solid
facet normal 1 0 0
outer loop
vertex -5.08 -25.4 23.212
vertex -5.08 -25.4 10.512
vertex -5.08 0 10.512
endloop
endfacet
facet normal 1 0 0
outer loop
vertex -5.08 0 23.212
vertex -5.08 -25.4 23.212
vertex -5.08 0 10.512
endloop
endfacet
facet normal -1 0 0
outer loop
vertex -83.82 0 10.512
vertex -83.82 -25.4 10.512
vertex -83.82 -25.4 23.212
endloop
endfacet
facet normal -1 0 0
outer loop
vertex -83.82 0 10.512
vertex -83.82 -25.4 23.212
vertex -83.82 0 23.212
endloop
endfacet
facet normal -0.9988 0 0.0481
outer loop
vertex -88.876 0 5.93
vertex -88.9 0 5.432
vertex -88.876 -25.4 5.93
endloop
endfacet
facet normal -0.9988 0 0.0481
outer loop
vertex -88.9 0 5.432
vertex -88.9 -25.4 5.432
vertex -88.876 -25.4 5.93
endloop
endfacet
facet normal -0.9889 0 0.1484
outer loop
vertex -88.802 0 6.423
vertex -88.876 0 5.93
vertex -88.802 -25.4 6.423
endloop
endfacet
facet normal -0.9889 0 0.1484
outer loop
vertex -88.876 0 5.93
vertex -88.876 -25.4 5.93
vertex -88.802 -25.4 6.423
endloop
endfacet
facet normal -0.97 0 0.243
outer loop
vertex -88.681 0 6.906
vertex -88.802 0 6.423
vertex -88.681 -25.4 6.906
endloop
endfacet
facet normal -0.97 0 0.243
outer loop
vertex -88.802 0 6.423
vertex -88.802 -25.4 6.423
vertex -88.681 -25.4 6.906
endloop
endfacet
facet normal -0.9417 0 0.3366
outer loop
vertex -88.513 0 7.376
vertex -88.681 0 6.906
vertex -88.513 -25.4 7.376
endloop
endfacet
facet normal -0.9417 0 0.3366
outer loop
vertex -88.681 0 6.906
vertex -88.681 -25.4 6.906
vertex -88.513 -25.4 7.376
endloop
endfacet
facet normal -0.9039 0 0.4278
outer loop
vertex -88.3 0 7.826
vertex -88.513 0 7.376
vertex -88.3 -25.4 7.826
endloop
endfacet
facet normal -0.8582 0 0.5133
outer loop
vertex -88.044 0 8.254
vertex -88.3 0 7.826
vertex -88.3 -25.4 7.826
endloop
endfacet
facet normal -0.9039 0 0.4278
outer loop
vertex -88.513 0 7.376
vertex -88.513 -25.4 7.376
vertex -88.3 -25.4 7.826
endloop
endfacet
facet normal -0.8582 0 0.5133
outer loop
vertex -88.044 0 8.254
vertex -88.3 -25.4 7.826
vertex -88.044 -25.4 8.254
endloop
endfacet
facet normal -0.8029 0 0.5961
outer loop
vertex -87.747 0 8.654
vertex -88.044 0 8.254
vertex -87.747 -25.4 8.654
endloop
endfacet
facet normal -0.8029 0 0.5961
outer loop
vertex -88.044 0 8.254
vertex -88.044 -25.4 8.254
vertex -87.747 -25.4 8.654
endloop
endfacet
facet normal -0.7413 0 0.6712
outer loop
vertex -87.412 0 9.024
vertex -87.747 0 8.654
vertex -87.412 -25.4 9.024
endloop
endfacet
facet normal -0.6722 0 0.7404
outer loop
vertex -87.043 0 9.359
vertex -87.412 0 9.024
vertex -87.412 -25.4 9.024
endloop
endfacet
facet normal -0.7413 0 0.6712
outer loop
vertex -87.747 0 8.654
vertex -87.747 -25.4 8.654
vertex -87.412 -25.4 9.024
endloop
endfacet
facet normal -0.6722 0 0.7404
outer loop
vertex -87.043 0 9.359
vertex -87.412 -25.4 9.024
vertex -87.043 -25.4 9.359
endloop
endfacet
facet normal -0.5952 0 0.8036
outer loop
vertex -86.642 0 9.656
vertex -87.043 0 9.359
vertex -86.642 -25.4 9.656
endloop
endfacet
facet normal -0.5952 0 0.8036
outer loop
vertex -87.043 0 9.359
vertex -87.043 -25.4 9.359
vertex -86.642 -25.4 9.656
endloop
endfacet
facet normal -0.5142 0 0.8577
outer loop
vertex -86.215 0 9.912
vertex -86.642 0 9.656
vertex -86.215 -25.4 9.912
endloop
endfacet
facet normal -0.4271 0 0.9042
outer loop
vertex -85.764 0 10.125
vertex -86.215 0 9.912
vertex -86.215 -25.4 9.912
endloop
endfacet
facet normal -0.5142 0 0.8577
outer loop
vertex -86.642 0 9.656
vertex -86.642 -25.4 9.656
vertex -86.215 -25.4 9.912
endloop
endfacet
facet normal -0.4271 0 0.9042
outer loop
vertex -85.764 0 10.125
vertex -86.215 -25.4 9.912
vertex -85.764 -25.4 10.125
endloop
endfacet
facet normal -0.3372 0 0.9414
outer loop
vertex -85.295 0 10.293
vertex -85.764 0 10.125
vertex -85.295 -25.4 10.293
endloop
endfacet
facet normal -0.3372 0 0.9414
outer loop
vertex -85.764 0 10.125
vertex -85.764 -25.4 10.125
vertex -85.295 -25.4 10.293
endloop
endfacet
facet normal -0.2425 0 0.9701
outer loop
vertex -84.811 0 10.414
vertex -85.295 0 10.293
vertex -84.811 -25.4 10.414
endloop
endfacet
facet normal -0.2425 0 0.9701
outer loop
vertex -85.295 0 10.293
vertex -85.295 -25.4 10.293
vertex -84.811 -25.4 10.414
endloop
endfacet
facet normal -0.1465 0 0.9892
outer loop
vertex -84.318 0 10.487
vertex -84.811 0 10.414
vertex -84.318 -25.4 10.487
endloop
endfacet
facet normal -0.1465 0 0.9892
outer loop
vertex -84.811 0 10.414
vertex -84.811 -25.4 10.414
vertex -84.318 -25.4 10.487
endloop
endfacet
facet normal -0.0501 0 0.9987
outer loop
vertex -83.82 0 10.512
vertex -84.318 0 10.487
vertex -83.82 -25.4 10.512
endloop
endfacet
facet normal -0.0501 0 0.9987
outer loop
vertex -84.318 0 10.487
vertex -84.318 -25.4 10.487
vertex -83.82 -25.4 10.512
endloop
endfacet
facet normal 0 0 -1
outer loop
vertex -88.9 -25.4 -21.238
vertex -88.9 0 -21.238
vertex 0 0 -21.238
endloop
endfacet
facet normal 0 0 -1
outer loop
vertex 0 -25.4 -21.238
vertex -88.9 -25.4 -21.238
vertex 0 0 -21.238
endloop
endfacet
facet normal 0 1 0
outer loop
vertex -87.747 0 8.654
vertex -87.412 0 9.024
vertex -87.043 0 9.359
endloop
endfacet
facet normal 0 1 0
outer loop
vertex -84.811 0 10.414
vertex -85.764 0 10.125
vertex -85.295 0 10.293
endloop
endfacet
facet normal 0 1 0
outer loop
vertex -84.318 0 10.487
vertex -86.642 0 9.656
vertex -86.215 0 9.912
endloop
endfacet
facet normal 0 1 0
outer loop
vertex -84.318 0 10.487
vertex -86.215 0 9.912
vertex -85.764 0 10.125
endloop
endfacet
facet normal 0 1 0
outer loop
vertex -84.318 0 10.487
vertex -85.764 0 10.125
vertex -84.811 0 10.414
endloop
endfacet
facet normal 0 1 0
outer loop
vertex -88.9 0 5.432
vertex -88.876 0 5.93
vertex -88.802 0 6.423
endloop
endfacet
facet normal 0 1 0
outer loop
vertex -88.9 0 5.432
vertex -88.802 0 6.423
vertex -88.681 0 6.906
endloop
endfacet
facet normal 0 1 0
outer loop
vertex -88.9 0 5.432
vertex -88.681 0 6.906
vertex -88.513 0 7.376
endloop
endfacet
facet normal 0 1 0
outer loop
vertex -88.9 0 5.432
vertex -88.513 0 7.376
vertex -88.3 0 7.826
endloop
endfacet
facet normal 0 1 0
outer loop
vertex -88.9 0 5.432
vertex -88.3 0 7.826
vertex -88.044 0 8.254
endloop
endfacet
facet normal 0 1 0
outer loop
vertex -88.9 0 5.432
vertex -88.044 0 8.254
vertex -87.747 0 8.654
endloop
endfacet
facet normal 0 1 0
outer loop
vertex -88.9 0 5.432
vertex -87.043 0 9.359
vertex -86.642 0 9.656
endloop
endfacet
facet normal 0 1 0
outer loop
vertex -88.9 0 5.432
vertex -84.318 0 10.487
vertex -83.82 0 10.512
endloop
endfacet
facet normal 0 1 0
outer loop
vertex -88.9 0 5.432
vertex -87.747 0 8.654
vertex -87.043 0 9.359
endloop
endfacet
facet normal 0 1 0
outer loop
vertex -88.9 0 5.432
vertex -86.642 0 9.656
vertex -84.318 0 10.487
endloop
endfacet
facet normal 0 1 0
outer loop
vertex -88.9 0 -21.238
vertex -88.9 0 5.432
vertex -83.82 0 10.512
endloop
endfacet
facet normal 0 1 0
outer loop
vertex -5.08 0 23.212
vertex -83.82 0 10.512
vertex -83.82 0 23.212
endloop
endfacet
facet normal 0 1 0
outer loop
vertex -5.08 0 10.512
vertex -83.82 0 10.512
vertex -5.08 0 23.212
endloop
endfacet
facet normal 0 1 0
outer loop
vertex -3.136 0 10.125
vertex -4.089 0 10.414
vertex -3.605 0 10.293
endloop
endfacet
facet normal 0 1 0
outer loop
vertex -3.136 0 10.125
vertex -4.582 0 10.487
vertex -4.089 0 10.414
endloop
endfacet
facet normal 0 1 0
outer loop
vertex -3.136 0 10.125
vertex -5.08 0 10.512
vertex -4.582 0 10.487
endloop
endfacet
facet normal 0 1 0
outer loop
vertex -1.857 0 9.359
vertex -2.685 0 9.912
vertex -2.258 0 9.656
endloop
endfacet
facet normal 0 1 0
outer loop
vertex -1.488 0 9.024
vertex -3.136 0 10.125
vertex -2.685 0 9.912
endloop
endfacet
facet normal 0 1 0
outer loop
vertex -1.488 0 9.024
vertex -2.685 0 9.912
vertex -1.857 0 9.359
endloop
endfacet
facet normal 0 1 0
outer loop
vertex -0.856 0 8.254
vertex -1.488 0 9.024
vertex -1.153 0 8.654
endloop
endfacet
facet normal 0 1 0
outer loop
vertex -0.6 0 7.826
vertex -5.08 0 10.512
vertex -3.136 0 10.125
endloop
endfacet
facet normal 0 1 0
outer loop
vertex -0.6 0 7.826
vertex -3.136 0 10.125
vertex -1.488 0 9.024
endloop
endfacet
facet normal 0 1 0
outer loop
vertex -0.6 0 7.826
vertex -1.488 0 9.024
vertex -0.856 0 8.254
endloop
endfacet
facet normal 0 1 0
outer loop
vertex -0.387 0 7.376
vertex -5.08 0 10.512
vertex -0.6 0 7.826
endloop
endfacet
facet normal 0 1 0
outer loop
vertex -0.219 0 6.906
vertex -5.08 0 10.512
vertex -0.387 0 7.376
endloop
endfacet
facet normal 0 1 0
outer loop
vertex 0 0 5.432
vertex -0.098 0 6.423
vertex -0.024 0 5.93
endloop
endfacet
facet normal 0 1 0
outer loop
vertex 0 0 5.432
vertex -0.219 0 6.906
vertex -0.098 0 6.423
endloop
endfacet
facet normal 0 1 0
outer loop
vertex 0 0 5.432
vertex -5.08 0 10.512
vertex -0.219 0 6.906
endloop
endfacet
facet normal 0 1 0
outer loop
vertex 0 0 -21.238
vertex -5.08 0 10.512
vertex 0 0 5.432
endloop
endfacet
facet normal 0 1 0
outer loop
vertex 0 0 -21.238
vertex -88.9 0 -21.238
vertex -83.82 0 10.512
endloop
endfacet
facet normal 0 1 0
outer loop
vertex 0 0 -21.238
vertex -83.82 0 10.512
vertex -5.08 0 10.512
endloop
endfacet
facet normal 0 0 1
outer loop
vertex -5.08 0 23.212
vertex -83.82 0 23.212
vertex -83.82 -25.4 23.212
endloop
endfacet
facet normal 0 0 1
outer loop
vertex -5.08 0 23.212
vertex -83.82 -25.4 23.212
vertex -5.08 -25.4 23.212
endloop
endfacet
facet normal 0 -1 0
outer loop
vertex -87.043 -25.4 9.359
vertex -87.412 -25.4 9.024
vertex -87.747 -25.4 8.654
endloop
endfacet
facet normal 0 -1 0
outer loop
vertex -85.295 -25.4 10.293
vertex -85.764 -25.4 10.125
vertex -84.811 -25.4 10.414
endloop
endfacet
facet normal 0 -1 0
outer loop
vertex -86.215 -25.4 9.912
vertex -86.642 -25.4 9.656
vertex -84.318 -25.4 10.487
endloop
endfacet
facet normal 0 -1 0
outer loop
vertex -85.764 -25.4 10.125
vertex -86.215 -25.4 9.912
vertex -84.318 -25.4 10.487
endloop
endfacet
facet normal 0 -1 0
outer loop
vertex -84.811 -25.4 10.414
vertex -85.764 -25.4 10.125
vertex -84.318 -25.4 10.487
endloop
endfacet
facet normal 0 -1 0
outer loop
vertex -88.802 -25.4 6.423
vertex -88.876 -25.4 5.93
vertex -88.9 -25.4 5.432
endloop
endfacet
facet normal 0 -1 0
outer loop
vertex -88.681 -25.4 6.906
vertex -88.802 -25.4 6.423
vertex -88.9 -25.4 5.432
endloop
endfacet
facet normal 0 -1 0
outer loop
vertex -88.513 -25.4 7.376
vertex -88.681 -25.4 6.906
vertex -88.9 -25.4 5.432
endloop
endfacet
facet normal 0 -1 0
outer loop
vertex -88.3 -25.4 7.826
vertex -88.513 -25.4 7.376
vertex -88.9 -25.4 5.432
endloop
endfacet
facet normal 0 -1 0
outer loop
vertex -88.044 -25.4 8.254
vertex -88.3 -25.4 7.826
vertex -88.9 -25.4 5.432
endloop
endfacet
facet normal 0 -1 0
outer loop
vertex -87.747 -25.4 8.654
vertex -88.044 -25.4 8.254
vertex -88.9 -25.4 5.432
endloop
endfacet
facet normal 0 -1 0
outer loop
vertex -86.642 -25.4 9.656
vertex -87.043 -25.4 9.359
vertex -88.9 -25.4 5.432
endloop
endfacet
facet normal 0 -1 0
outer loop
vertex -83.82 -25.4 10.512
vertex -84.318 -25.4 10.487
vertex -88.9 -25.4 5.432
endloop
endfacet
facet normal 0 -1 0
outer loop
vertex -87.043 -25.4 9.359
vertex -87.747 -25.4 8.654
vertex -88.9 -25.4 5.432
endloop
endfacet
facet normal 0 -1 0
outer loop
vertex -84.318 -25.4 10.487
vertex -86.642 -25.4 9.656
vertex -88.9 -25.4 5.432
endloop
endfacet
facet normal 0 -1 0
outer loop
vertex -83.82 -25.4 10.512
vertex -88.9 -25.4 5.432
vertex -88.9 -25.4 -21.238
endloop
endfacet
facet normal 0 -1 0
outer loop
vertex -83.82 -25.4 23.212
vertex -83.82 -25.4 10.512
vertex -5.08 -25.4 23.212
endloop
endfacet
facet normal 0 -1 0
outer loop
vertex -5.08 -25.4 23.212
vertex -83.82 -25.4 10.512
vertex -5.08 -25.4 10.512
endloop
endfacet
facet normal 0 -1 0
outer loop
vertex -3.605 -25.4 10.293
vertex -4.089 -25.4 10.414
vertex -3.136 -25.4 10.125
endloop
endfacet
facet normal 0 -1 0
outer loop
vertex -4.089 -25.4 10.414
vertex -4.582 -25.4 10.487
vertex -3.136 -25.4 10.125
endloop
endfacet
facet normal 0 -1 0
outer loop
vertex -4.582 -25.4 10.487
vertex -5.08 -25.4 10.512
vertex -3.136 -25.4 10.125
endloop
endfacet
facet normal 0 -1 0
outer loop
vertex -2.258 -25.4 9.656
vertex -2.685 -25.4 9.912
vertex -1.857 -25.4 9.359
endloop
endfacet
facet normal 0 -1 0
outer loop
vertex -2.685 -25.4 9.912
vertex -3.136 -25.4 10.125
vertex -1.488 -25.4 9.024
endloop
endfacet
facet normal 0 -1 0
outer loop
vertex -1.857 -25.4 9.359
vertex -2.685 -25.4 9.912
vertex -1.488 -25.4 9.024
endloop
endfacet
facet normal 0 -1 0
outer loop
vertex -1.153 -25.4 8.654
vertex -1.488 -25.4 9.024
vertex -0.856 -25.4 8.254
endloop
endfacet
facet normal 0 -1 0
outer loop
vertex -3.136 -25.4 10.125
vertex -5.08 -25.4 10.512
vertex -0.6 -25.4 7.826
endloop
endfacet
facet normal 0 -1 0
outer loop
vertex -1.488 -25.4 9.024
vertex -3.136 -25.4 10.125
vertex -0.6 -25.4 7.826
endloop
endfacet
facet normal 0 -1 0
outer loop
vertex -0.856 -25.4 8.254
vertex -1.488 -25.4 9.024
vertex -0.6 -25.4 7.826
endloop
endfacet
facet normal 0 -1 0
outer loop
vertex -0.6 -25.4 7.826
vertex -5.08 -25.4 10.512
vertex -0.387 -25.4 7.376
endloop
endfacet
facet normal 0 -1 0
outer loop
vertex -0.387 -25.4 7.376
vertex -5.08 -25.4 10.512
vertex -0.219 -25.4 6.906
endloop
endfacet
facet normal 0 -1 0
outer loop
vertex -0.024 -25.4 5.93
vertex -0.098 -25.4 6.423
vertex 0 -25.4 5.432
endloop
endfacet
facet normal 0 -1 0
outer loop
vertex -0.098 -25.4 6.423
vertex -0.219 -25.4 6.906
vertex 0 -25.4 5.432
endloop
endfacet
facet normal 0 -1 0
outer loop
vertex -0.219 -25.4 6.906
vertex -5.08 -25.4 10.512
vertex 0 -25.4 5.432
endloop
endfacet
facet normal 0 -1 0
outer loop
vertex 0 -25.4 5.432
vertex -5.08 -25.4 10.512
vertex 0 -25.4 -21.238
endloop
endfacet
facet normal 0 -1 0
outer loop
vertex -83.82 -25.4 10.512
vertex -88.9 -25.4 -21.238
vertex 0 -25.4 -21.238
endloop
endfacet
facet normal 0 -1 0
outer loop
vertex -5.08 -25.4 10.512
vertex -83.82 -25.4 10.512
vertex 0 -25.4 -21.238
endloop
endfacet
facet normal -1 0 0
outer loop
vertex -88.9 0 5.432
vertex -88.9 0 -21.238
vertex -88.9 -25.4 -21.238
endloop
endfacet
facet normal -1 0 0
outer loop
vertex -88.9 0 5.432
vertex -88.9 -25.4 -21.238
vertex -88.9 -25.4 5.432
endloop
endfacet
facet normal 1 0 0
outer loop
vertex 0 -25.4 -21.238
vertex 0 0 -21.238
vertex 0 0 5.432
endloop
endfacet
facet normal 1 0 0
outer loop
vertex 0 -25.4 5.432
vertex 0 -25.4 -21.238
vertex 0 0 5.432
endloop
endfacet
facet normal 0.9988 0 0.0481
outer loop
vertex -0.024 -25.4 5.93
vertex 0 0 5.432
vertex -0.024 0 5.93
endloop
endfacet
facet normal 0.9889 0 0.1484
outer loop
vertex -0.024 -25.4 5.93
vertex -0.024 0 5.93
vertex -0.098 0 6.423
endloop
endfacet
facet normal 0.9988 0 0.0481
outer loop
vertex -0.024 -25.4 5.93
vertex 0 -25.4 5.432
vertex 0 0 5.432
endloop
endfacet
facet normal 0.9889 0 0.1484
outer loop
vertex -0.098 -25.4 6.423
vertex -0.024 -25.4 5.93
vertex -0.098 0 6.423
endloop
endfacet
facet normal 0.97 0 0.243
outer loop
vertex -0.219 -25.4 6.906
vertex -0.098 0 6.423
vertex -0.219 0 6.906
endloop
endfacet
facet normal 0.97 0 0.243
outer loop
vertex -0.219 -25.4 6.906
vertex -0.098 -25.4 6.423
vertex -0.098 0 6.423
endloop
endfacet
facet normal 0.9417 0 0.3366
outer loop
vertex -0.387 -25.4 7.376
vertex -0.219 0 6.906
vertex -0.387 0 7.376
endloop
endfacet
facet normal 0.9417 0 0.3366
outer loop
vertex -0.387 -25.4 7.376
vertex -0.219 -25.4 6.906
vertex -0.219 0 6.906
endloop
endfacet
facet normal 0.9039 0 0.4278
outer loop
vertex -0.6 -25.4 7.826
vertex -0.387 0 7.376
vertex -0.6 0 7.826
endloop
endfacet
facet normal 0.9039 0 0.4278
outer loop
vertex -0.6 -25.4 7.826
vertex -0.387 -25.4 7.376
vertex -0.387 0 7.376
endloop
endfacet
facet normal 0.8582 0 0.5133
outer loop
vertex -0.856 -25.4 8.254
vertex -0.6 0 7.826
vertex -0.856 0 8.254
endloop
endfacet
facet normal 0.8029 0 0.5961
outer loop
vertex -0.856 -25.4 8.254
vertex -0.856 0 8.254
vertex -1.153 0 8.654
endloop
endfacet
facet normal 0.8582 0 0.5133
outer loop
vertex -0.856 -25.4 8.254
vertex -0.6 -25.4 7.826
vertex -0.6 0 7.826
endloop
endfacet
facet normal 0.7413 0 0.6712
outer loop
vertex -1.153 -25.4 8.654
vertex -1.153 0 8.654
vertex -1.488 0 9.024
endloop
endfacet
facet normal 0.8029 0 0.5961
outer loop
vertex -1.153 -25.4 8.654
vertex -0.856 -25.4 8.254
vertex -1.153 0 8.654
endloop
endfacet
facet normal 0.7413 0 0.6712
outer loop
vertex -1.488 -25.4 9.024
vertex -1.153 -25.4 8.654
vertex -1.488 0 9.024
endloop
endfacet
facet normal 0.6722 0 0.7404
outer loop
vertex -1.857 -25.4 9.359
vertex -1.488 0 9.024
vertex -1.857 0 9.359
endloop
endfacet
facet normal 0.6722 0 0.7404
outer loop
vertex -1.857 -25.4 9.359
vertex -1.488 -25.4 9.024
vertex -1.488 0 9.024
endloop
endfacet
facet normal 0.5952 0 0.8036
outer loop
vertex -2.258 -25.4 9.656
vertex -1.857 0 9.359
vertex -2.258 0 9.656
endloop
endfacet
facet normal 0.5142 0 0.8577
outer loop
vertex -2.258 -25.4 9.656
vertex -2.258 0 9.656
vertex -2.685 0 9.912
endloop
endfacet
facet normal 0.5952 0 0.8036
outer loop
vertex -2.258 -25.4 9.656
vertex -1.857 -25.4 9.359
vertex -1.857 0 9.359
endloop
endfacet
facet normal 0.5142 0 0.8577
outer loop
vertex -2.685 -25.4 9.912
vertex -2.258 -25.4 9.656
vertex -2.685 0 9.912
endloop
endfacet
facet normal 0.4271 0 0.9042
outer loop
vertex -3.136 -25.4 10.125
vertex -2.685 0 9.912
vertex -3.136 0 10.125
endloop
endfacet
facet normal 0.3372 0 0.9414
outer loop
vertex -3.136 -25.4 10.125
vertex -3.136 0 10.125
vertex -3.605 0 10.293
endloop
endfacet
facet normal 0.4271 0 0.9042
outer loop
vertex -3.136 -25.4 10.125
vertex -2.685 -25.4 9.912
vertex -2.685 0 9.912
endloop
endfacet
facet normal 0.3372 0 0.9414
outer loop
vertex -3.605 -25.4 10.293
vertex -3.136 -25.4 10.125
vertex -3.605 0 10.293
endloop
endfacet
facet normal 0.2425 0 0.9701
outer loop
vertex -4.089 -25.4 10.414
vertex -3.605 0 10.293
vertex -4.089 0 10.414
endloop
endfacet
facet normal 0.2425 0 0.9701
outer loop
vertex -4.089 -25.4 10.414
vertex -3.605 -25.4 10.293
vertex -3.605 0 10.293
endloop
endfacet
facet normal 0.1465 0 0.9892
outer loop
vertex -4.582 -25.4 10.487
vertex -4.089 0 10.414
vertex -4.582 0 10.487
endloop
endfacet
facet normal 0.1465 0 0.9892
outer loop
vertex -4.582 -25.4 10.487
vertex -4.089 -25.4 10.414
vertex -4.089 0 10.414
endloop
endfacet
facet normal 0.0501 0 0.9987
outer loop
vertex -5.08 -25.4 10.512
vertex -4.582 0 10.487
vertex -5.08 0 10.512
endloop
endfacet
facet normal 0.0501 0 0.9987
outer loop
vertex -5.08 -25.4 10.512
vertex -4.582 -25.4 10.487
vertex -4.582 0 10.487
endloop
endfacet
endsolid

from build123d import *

# Parameters (mm, degrees)
F0_W      = 88.9
F0_H      = 31.75
F1_DEPTH  = 25.4
F2_R      = 5.08
F1_FACE_W = 78.74
F1_FACE_H = 25.4
F3_DEPTH  = 12.7


with BuildPart() as f1:
    # F0 (on Front) → F1 (new body)
    with BuildSketch(Plane.XZ):
        with Locations((-44.45, -5.363265)):
            Rectangle(F0_W, F0_H)
    extrude(amount=F1_DEPTH)

    # F2
    f2_edges = [f1.edges().sort_by_distance(p)[0] for p in [
        (-88.9, -12.7, 10.511735),
        (0, -12.7, 10.511735),
    ]]
    fillet(f2_edges, radius=F2_R)

    # F1_face (on face) → F3 (join)
    with BuildSketch(Plane(origin=(-44.45, -12.7, 10.511735), x_dir=(1, 0, 0), z_dir=(0, 0, 1))):
        Rectangle(F1_FACE_W, F1_FACE_H)
    extrude(amount=F3_DEPTH)


solid = f1.part
